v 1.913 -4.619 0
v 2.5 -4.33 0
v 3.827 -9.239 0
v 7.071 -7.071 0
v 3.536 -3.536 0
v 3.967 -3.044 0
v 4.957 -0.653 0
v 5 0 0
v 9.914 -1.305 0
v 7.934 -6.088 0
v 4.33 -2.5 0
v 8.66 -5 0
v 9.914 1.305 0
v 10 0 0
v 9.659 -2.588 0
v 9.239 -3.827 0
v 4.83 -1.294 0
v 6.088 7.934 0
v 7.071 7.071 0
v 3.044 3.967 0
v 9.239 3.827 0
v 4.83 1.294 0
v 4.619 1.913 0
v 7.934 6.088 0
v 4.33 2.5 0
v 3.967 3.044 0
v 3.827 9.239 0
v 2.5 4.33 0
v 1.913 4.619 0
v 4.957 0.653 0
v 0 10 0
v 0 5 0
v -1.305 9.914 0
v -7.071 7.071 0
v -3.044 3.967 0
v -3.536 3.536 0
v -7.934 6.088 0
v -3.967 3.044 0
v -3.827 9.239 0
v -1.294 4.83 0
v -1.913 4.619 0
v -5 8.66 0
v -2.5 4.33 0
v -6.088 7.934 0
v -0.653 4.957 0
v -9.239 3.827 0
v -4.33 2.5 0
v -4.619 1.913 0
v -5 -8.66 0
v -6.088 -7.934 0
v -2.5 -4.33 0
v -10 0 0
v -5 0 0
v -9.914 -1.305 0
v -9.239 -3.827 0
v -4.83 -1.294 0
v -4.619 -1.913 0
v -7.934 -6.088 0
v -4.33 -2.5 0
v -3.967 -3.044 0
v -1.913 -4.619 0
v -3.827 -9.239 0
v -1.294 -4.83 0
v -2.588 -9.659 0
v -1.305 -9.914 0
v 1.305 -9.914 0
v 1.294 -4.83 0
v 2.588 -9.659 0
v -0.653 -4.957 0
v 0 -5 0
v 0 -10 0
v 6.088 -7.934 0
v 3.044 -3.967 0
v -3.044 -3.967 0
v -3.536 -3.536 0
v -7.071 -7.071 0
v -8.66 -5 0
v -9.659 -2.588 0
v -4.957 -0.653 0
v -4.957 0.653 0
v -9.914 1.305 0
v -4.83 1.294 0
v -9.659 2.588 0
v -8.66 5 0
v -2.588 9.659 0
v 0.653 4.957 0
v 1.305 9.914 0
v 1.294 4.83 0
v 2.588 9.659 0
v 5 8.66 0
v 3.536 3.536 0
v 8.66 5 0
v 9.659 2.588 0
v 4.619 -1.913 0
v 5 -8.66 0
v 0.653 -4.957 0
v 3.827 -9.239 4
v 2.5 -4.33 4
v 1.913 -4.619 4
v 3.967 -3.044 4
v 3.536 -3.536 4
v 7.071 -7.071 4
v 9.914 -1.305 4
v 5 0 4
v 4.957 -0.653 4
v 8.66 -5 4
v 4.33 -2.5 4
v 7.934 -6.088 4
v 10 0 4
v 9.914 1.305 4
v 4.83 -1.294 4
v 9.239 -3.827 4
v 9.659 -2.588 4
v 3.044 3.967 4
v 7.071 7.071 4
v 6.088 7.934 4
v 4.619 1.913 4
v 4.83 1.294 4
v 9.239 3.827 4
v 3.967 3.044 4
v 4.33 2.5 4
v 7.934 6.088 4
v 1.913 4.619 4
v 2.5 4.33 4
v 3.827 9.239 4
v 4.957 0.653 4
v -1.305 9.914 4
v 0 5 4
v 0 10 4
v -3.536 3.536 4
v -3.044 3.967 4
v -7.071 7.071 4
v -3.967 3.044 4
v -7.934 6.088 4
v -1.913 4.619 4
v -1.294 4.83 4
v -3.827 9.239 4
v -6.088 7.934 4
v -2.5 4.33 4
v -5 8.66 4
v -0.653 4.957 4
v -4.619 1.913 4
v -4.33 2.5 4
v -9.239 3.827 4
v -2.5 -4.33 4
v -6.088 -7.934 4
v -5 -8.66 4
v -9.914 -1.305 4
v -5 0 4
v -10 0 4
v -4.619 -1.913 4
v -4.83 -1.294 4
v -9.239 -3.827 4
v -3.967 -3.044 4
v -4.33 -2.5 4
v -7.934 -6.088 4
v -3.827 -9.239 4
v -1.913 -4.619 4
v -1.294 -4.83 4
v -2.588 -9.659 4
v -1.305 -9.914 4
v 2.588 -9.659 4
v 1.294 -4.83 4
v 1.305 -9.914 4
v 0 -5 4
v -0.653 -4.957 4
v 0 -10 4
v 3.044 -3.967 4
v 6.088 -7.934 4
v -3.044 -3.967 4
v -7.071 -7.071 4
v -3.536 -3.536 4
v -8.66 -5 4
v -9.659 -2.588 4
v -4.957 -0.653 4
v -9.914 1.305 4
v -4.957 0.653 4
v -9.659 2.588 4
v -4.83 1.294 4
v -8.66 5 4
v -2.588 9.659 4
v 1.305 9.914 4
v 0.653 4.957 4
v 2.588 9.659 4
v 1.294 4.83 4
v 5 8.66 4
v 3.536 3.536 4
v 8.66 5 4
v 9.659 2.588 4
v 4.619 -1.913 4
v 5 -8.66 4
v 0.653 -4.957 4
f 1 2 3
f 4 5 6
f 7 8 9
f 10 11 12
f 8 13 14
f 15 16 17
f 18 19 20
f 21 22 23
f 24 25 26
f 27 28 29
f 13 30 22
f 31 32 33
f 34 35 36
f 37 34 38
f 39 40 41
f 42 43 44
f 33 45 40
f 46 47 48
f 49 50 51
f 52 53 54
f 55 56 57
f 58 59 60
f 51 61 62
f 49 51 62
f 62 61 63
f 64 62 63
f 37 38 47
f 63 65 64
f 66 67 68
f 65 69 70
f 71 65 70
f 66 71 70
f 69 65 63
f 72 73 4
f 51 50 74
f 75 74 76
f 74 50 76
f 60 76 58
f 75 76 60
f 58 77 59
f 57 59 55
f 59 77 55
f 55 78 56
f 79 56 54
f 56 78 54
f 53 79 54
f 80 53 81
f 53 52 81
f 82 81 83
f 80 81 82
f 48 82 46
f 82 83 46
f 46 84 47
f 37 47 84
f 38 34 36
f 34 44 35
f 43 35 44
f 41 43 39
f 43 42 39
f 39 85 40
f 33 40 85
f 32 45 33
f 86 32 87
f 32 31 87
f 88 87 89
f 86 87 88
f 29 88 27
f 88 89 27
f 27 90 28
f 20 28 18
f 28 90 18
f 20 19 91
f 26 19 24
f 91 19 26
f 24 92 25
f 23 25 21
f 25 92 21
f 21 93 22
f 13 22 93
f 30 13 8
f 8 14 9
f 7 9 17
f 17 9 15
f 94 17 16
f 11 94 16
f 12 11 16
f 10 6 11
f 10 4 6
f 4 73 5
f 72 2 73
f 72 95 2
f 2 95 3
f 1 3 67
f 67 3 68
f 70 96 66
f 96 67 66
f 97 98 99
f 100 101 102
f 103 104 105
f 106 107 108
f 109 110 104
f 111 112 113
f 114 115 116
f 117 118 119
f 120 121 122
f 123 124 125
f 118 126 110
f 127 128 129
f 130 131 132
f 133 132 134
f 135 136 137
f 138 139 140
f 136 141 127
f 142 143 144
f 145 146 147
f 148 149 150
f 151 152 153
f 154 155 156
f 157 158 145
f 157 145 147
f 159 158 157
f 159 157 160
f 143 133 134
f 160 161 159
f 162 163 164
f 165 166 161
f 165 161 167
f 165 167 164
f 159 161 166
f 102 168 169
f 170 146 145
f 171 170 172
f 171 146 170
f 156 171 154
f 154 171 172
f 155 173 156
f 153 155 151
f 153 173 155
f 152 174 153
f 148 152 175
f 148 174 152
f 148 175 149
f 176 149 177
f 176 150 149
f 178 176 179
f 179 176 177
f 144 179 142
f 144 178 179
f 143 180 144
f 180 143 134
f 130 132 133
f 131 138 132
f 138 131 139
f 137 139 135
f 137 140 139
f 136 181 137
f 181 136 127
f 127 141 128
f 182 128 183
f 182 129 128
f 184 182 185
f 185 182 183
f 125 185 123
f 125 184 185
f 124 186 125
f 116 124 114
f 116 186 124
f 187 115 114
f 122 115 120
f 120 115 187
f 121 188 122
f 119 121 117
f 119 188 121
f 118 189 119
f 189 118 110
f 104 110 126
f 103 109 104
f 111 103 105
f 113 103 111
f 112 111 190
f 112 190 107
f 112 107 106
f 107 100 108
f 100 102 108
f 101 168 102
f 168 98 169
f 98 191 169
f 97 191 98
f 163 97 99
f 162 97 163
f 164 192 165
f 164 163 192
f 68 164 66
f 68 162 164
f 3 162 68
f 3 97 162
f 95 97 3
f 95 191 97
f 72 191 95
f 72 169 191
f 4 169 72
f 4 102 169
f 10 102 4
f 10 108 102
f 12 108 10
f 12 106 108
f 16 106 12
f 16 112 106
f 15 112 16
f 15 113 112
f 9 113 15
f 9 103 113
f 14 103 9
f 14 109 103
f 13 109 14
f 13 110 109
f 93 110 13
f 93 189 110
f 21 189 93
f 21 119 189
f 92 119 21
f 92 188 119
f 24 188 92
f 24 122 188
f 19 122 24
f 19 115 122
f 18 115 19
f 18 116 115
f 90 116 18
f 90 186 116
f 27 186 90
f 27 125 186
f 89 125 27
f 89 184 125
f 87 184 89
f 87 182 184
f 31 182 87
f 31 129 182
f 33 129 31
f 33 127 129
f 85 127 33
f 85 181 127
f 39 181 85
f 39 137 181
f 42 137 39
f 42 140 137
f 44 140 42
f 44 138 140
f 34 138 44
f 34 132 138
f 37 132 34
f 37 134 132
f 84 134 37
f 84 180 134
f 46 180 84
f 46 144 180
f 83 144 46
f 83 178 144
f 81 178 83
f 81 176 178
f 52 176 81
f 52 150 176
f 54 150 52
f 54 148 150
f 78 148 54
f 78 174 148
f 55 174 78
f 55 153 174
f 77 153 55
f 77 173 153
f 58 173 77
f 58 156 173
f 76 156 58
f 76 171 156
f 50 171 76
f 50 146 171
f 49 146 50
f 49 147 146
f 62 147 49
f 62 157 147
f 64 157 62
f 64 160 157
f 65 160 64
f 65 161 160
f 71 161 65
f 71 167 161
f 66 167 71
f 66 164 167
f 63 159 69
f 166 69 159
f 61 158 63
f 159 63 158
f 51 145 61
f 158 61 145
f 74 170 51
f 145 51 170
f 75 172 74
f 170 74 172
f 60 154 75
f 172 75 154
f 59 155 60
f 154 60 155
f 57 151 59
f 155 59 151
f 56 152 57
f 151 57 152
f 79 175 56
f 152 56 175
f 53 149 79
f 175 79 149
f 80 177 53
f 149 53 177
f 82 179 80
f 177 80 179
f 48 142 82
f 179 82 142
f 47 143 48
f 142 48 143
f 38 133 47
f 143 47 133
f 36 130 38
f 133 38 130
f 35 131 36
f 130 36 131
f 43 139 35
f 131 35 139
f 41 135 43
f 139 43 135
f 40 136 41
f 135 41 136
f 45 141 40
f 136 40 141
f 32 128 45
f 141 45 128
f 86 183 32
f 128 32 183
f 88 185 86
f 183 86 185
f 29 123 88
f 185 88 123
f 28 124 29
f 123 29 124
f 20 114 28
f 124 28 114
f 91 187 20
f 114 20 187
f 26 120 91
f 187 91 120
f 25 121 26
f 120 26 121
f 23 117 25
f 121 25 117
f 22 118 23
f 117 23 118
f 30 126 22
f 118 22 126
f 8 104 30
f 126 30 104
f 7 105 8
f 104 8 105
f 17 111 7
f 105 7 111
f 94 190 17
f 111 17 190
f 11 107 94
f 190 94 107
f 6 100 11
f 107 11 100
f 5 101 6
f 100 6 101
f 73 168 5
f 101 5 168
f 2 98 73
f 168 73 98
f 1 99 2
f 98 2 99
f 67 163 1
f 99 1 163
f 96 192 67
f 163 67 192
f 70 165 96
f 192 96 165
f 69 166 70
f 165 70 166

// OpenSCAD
linear_extrude(4) difference(){ circle(10, $fn=48); circle(5, $fn=48); }
